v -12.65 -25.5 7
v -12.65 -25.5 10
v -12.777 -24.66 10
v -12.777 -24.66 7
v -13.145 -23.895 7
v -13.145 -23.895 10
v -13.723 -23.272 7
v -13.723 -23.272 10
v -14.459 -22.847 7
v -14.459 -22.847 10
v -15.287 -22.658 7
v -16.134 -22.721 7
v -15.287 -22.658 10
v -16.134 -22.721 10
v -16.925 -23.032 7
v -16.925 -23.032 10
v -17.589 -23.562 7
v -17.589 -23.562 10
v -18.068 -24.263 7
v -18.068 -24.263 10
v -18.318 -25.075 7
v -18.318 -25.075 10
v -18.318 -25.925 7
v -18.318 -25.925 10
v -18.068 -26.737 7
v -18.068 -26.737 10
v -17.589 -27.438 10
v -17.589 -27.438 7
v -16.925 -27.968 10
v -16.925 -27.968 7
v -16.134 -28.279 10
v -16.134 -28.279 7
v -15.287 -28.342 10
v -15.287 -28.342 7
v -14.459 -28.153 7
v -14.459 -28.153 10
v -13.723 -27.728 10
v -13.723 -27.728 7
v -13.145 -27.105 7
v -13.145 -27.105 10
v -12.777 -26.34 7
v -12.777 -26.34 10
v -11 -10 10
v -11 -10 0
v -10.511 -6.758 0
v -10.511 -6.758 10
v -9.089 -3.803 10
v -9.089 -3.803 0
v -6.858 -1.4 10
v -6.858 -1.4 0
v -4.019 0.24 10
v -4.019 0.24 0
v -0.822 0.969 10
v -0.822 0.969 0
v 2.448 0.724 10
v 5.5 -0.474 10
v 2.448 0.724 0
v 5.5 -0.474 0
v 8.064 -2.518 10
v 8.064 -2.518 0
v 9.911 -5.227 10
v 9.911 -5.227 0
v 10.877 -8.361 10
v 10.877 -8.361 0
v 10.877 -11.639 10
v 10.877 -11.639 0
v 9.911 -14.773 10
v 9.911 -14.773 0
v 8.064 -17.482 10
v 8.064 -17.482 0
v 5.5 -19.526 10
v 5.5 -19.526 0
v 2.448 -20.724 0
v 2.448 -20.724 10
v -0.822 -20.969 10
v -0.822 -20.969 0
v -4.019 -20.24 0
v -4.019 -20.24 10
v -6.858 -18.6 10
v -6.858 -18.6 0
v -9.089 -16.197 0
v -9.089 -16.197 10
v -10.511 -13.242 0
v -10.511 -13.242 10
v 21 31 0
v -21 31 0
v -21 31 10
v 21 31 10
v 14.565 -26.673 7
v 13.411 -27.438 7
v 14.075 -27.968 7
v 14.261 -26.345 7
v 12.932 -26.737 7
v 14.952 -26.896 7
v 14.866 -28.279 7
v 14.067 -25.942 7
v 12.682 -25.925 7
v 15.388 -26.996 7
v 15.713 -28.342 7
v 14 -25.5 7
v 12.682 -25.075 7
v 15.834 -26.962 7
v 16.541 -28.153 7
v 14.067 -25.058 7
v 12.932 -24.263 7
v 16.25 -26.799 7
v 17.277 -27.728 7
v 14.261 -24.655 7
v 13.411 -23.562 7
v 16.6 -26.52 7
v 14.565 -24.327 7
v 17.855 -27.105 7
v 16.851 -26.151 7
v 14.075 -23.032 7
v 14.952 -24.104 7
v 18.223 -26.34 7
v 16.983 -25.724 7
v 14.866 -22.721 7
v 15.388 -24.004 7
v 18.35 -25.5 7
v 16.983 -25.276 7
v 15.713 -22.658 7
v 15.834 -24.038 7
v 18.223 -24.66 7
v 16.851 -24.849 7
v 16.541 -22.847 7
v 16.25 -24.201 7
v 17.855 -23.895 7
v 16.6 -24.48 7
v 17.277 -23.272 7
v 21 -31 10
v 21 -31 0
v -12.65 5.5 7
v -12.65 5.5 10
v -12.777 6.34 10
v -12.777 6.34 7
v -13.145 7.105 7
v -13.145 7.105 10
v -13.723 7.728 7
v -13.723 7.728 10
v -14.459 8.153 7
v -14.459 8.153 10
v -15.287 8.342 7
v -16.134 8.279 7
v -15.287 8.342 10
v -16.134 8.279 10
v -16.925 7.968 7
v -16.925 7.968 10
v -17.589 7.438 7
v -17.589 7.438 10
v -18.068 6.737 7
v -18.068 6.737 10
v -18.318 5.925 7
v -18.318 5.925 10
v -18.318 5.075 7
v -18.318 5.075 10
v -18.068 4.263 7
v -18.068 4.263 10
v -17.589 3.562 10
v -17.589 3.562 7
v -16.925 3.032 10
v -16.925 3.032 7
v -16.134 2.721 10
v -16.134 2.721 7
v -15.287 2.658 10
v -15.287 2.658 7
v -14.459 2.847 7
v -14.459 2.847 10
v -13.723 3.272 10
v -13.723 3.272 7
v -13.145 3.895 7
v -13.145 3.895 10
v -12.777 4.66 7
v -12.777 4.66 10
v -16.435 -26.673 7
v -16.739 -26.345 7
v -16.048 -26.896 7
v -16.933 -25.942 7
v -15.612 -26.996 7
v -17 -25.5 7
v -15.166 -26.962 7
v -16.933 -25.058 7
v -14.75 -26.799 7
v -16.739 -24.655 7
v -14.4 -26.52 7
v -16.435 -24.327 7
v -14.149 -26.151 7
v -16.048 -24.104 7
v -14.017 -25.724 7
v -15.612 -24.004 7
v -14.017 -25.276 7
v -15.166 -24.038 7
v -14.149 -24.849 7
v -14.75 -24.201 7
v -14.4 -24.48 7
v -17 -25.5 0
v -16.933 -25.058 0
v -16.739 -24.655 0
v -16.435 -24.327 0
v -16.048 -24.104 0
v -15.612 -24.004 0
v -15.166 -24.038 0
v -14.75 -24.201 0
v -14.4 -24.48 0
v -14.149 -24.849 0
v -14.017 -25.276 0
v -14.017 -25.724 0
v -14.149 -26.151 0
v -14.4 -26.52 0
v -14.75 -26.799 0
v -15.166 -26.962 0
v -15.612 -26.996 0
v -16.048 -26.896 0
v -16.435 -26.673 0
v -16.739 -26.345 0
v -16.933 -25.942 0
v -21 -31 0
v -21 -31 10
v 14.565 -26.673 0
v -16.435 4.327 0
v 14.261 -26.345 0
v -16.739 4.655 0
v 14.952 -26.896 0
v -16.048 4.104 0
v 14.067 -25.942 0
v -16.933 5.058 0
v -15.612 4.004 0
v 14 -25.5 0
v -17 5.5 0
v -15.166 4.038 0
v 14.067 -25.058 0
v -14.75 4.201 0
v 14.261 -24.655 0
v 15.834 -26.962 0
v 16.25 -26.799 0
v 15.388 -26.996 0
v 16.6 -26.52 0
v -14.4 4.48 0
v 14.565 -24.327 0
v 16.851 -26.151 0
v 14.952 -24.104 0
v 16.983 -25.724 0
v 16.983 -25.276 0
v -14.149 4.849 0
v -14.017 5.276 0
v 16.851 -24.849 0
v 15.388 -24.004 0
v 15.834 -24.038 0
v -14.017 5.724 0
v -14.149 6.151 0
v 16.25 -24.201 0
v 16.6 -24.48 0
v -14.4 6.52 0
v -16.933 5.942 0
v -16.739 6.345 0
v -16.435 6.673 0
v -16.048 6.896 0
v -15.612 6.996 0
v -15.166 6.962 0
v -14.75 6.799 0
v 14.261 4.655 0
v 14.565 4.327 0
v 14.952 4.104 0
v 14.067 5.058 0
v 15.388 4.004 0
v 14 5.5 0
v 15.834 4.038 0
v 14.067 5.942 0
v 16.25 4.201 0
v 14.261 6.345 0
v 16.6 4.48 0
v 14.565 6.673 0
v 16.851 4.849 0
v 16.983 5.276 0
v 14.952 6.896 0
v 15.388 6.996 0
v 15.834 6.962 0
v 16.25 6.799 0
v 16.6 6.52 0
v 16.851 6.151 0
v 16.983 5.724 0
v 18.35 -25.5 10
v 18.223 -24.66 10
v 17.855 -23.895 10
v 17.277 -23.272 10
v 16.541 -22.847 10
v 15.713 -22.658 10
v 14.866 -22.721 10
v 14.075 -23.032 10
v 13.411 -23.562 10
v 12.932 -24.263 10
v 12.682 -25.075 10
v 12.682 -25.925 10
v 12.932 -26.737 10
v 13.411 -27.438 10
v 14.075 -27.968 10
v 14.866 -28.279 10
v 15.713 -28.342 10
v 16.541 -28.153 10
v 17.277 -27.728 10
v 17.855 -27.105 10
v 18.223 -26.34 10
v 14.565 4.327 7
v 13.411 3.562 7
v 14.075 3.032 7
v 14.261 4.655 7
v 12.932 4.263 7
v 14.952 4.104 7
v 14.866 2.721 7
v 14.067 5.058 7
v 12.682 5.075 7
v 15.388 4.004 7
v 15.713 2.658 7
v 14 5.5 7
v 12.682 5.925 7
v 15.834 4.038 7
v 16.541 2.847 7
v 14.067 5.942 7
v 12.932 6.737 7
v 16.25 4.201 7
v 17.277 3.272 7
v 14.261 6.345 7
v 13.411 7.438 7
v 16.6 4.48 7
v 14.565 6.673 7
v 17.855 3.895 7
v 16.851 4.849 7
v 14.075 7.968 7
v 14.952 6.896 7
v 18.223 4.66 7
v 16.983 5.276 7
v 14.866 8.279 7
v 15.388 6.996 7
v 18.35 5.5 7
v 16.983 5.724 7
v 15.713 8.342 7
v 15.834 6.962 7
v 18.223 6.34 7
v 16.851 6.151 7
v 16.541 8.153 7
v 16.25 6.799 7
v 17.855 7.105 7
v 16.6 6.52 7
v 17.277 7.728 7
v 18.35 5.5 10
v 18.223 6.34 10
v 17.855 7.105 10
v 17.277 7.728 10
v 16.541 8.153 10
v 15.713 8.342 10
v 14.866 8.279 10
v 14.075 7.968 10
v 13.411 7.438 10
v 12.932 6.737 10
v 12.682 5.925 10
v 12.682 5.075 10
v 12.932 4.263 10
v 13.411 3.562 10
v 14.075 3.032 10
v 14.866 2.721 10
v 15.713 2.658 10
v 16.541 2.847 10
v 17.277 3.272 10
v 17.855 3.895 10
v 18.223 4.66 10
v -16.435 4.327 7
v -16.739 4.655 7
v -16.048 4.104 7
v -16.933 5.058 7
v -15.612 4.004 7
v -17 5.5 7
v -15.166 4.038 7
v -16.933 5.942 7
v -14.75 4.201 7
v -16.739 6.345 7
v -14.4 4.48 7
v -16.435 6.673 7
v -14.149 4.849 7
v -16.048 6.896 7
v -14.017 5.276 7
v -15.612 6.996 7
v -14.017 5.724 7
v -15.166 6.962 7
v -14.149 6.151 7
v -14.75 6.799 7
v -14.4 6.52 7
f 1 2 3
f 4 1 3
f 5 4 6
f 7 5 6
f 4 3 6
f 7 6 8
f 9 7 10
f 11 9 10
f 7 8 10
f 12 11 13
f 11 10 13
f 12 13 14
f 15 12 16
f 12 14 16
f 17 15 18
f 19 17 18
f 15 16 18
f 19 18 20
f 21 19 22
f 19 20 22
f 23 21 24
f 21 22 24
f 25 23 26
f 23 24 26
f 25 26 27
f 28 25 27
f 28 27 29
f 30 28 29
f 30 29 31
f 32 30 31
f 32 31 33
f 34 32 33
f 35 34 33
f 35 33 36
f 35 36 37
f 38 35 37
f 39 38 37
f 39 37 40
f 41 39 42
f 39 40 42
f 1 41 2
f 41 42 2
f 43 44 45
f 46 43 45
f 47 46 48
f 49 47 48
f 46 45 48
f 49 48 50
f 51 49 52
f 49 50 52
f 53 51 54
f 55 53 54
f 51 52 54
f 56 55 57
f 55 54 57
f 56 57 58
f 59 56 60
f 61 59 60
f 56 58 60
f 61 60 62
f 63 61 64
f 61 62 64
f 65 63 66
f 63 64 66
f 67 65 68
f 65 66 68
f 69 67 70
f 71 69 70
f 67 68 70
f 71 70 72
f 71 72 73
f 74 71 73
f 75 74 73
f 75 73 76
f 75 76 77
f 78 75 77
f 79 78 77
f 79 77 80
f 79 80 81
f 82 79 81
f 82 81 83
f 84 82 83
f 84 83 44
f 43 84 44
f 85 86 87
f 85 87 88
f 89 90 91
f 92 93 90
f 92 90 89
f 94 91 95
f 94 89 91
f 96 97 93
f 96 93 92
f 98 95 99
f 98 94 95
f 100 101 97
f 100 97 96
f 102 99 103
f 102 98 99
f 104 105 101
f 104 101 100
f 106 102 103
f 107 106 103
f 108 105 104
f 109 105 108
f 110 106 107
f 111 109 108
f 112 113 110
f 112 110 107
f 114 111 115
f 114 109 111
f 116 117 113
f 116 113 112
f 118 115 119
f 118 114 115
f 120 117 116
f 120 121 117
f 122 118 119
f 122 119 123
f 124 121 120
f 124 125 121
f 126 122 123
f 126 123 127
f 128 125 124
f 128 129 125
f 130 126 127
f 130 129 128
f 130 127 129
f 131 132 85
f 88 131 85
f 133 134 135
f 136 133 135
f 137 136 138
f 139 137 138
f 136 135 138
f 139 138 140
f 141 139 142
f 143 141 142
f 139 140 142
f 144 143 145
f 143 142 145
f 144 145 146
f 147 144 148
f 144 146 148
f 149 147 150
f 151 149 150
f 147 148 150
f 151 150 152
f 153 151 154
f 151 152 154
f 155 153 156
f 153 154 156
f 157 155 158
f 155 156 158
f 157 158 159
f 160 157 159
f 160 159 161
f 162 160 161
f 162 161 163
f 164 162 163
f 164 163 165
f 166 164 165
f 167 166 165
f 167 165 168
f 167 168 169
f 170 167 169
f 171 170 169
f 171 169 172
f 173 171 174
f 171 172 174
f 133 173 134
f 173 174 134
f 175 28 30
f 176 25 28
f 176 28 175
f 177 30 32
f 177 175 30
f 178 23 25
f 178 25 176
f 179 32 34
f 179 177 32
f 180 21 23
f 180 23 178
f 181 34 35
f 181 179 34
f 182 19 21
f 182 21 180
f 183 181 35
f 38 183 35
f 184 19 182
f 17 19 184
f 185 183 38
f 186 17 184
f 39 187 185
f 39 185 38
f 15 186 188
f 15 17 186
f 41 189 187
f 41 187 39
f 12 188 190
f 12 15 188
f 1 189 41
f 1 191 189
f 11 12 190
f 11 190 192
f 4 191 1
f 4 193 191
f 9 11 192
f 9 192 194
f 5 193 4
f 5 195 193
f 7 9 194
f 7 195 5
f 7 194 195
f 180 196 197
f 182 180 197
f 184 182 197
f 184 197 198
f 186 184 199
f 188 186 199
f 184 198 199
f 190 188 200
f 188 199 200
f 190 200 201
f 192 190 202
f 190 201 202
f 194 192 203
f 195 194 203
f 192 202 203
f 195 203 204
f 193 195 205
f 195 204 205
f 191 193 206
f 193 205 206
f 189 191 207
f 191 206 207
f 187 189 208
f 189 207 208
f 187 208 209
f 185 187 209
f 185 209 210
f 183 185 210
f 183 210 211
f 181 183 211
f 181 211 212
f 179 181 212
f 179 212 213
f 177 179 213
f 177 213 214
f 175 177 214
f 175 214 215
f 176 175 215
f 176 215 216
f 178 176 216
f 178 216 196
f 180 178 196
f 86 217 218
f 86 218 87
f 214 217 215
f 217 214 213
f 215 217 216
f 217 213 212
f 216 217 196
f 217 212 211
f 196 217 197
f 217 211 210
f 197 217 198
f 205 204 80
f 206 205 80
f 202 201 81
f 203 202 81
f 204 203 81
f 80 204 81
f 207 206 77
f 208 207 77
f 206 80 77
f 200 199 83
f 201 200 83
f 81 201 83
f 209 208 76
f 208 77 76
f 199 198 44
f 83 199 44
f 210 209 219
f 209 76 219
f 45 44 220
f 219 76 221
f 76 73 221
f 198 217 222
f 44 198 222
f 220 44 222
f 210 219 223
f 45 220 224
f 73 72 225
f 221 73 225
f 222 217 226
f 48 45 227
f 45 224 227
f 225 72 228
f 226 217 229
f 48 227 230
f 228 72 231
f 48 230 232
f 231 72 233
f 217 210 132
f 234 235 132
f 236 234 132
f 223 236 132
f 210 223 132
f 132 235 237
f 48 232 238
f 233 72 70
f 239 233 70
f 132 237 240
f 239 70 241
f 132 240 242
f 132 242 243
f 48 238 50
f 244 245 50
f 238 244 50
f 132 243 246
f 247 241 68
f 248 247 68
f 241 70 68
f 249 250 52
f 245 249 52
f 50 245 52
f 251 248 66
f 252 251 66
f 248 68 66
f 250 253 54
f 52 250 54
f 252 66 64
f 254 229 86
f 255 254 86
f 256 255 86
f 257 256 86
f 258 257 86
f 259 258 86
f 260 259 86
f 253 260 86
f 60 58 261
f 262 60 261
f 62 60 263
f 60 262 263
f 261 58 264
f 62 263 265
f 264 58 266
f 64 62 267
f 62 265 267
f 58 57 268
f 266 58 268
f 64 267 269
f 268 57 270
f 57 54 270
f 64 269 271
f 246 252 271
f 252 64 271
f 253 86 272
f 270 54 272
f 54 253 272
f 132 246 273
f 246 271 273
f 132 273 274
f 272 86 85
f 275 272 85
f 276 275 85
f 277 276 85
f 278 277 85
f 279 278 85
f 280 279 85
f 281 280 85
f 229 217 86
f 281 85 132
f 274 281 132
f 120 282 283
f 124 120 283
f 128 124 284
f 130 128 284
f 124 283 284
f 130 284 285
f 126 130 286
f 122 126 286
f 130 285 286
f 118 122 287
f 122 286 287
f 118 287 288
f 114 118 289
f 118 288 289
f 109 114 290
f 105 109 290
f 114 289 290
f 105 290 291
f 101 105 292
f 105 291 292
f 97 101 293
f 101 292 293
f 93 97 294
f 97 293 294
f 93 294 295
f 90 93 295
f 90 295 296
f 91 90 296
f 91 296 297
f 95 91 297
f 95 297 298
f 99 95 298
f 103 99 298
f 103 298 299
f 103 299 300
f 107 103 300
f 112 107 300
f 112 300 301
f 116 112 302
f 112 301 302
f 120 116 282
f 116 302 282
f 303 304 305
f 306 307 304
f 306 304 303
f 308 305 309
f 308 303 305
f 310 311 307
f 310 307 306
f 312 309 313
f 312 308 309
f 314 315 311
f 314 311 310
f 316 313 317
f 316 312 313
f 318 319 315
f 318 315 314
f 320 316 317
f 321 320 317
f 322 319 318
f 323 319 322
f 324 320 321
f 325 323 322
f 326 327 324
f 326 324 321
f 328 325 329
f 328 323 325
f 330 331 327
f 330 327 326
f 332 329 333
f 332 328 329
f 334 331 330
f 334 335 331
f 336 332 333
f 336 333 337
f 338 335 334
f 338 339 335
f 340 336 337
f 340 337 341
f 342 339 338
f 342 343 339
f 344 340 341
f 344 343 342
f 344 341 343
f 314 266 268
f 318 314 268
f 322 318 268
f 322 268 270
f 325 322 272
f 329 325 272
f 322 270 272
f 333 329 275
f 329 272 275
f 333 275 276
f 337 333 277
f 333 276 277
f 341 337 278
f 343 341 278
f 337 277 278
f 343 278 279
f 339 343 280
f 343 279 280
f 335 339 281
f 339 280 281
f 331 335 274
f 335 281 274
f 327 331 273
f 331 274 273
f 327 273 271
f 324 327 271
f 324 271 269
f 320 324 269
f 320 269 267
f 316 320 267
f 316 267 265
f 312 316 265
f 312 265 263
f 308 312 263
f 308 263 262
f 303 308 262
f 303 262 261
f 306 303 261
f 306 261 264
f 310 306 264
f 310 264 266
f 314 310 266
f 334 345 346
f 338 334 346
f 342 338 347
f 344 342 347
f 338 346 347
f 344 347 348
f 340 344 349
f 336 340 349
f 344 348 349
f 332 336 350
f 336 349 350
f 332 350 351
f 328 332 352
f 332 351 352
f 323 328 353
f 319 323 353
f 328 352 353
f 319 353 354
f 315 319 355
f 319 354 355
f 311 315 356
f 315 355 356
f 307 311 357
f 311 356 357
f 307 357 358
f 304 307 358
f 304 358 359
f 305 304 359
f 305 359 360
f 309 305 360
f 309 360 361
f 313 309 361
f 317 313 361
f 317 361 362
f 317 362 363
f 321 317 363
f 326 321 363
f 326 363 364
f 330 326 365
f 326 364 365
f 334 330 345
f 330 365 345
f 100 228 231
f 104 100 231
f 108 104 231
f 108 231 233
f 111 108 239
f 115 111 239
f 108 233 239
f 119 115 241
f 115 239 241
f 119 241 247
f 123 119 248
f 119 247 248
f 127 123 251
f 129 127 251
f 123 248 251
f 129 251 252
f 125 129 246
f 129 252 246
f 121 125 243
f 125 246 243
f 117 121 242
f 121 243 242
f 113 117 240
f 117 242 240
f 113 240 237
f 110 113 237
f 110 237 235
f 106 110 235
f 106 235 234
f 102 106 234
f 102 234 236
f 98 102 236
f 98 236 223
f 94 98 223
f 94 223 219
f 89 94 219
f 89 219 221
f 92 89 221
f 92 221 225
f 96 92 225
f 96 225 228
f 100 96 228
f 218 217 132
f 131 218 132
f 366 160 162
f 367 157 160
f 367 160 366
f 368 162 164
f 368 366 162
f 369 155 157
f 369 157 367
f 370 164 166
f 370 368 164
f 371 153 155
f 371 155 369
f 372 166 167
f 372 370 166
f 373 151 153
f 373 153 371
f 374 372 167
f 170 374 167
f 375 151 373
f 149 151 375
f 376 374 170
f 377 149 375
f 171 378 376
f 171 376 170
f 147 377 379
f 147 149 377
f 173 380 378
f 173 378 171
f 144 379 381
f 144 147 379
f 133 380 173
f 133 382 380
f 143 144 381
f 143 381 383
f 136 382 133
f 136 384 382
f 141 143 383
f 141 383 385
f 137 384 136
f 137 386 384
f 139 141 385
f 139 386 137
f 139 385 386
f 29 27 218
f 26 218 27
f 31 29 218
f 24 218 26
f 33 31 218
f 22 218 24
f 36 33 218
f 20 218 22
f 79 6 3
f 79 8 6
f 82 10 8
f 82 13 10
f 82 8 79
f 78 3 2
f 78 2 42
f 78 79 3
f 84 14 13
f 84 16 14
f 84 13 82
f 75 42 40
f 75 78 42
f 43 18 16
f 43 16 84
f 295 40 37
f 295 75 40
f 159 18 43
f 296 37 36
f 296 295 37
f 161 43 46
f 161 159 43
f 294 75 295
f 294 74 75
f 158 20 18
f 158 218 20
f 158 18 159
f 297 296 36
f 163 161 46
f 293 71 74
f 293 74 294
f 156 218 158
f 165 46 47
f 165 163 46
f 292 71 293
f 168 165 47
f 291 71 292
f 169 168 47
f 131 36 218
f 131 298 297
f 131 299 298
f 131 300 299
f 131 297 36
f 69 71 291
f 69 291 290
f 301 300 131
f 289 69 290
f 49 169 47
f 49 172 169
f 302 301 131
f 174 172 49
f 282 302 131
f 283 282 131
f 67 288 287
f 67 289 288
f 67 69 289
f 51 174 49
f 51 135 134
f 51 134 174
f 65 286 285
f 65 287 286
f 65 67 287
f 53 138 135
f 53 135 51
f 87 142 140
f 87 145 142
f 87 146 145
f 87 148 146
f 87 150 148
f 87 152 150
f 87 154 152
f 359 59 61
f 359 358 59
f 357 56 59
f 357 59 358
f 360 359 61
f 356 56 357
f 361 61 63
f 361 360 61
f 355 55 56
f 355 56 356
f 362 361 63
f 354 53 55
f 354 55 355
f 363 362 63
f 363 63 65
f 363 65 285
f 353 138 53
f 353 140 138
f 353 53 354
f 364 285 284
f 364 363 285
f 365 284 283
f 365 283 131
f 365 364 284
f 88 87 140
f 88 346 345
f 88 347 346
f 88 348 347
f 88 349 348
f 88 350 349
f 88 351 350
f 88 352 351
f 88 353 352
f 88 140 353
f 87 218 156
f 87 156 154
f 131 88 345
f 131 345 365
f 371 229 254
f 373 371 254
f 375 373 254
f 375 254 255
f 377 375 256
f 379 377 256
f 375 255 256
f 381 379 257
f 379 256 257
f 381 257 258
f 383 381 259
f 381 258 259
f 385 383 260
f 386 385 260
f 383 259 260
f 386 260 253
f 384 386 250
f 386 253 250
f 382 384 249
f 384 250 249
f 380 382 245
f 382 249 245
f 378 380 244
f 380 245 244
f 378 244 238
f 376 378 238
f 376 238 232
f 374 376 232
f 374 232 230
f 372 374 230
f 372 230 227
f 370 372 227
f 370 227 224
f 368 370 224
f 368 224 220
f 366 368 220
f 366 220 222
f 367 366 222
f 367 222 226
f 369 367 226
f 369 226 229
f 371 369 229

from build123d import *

# Parameters (mm, degrees)
SKETCH1_W           = 42
SKETCH1_H           = 62
BOSS_EXTRUDE1_DEPTH = 10
SKETCH2_R           = 1.5
SKETCH2_R_2         = 11
CUT_EXTRUDE1_DEPTH  = 11
SKETCH3_R           = 2.85
CUT_EXTRUDE2_DEPTH  = 3


with BuildPart() as part:
    # Sketch1 → Boss-Extrude1 (new body)
    with BuildSketch(Plane.XY):
        Rectangle(SKETCH1_W, SKETCH1_H)
    extrude(amount=BOSS_EXTRUDE1_DEPTH)

    # Sketch2 → Cut-Extrude1 (cut, through all)
    with BuildSketch(Plane(origin=(0, 0, 0), x_dir=(-1, 0, 0), z_dir=(0, 0, -1))):
        with Locations((15.5, 5.5)):
            Circle(SKETCH2_R)
        with Locations((15.5, -25.5)):
            Circle(SKETCH2_R)
        with Locations((-15.5, -25.5)):
            Circle(SKETCH2_R)
        with Locations((-15.5, 5.5)):
            Circle(SKETCH2_R)
        with Locations((0, -10)):
            Circle(SKETCH2_R_2)
    extrude(amount=-CUT_EXTRUDE1_DEPTH, mode=Mode.SUBTRACT)

    # Sketch3 → Cut-Extrude2 (cut)
    with BuildSketch(Plane.XY.offset(10)):
        with Locations((-15.5, 5.5)):
            Circle(SKETCH3_R)
        with Locations((15.5, 5.5)):
            Circle(SKETCH3_R)
        with Locations((15.5, -25.5)):
            Circle(SKETCH3_R)
        with Locations((-15.5, -25.5)):
            Circle(SKETCH3_R)
    extrude(amount=-CUT_EXTRUDE2_DEPTH, mode=Mode.SUBTRACT)


solid = part.part
